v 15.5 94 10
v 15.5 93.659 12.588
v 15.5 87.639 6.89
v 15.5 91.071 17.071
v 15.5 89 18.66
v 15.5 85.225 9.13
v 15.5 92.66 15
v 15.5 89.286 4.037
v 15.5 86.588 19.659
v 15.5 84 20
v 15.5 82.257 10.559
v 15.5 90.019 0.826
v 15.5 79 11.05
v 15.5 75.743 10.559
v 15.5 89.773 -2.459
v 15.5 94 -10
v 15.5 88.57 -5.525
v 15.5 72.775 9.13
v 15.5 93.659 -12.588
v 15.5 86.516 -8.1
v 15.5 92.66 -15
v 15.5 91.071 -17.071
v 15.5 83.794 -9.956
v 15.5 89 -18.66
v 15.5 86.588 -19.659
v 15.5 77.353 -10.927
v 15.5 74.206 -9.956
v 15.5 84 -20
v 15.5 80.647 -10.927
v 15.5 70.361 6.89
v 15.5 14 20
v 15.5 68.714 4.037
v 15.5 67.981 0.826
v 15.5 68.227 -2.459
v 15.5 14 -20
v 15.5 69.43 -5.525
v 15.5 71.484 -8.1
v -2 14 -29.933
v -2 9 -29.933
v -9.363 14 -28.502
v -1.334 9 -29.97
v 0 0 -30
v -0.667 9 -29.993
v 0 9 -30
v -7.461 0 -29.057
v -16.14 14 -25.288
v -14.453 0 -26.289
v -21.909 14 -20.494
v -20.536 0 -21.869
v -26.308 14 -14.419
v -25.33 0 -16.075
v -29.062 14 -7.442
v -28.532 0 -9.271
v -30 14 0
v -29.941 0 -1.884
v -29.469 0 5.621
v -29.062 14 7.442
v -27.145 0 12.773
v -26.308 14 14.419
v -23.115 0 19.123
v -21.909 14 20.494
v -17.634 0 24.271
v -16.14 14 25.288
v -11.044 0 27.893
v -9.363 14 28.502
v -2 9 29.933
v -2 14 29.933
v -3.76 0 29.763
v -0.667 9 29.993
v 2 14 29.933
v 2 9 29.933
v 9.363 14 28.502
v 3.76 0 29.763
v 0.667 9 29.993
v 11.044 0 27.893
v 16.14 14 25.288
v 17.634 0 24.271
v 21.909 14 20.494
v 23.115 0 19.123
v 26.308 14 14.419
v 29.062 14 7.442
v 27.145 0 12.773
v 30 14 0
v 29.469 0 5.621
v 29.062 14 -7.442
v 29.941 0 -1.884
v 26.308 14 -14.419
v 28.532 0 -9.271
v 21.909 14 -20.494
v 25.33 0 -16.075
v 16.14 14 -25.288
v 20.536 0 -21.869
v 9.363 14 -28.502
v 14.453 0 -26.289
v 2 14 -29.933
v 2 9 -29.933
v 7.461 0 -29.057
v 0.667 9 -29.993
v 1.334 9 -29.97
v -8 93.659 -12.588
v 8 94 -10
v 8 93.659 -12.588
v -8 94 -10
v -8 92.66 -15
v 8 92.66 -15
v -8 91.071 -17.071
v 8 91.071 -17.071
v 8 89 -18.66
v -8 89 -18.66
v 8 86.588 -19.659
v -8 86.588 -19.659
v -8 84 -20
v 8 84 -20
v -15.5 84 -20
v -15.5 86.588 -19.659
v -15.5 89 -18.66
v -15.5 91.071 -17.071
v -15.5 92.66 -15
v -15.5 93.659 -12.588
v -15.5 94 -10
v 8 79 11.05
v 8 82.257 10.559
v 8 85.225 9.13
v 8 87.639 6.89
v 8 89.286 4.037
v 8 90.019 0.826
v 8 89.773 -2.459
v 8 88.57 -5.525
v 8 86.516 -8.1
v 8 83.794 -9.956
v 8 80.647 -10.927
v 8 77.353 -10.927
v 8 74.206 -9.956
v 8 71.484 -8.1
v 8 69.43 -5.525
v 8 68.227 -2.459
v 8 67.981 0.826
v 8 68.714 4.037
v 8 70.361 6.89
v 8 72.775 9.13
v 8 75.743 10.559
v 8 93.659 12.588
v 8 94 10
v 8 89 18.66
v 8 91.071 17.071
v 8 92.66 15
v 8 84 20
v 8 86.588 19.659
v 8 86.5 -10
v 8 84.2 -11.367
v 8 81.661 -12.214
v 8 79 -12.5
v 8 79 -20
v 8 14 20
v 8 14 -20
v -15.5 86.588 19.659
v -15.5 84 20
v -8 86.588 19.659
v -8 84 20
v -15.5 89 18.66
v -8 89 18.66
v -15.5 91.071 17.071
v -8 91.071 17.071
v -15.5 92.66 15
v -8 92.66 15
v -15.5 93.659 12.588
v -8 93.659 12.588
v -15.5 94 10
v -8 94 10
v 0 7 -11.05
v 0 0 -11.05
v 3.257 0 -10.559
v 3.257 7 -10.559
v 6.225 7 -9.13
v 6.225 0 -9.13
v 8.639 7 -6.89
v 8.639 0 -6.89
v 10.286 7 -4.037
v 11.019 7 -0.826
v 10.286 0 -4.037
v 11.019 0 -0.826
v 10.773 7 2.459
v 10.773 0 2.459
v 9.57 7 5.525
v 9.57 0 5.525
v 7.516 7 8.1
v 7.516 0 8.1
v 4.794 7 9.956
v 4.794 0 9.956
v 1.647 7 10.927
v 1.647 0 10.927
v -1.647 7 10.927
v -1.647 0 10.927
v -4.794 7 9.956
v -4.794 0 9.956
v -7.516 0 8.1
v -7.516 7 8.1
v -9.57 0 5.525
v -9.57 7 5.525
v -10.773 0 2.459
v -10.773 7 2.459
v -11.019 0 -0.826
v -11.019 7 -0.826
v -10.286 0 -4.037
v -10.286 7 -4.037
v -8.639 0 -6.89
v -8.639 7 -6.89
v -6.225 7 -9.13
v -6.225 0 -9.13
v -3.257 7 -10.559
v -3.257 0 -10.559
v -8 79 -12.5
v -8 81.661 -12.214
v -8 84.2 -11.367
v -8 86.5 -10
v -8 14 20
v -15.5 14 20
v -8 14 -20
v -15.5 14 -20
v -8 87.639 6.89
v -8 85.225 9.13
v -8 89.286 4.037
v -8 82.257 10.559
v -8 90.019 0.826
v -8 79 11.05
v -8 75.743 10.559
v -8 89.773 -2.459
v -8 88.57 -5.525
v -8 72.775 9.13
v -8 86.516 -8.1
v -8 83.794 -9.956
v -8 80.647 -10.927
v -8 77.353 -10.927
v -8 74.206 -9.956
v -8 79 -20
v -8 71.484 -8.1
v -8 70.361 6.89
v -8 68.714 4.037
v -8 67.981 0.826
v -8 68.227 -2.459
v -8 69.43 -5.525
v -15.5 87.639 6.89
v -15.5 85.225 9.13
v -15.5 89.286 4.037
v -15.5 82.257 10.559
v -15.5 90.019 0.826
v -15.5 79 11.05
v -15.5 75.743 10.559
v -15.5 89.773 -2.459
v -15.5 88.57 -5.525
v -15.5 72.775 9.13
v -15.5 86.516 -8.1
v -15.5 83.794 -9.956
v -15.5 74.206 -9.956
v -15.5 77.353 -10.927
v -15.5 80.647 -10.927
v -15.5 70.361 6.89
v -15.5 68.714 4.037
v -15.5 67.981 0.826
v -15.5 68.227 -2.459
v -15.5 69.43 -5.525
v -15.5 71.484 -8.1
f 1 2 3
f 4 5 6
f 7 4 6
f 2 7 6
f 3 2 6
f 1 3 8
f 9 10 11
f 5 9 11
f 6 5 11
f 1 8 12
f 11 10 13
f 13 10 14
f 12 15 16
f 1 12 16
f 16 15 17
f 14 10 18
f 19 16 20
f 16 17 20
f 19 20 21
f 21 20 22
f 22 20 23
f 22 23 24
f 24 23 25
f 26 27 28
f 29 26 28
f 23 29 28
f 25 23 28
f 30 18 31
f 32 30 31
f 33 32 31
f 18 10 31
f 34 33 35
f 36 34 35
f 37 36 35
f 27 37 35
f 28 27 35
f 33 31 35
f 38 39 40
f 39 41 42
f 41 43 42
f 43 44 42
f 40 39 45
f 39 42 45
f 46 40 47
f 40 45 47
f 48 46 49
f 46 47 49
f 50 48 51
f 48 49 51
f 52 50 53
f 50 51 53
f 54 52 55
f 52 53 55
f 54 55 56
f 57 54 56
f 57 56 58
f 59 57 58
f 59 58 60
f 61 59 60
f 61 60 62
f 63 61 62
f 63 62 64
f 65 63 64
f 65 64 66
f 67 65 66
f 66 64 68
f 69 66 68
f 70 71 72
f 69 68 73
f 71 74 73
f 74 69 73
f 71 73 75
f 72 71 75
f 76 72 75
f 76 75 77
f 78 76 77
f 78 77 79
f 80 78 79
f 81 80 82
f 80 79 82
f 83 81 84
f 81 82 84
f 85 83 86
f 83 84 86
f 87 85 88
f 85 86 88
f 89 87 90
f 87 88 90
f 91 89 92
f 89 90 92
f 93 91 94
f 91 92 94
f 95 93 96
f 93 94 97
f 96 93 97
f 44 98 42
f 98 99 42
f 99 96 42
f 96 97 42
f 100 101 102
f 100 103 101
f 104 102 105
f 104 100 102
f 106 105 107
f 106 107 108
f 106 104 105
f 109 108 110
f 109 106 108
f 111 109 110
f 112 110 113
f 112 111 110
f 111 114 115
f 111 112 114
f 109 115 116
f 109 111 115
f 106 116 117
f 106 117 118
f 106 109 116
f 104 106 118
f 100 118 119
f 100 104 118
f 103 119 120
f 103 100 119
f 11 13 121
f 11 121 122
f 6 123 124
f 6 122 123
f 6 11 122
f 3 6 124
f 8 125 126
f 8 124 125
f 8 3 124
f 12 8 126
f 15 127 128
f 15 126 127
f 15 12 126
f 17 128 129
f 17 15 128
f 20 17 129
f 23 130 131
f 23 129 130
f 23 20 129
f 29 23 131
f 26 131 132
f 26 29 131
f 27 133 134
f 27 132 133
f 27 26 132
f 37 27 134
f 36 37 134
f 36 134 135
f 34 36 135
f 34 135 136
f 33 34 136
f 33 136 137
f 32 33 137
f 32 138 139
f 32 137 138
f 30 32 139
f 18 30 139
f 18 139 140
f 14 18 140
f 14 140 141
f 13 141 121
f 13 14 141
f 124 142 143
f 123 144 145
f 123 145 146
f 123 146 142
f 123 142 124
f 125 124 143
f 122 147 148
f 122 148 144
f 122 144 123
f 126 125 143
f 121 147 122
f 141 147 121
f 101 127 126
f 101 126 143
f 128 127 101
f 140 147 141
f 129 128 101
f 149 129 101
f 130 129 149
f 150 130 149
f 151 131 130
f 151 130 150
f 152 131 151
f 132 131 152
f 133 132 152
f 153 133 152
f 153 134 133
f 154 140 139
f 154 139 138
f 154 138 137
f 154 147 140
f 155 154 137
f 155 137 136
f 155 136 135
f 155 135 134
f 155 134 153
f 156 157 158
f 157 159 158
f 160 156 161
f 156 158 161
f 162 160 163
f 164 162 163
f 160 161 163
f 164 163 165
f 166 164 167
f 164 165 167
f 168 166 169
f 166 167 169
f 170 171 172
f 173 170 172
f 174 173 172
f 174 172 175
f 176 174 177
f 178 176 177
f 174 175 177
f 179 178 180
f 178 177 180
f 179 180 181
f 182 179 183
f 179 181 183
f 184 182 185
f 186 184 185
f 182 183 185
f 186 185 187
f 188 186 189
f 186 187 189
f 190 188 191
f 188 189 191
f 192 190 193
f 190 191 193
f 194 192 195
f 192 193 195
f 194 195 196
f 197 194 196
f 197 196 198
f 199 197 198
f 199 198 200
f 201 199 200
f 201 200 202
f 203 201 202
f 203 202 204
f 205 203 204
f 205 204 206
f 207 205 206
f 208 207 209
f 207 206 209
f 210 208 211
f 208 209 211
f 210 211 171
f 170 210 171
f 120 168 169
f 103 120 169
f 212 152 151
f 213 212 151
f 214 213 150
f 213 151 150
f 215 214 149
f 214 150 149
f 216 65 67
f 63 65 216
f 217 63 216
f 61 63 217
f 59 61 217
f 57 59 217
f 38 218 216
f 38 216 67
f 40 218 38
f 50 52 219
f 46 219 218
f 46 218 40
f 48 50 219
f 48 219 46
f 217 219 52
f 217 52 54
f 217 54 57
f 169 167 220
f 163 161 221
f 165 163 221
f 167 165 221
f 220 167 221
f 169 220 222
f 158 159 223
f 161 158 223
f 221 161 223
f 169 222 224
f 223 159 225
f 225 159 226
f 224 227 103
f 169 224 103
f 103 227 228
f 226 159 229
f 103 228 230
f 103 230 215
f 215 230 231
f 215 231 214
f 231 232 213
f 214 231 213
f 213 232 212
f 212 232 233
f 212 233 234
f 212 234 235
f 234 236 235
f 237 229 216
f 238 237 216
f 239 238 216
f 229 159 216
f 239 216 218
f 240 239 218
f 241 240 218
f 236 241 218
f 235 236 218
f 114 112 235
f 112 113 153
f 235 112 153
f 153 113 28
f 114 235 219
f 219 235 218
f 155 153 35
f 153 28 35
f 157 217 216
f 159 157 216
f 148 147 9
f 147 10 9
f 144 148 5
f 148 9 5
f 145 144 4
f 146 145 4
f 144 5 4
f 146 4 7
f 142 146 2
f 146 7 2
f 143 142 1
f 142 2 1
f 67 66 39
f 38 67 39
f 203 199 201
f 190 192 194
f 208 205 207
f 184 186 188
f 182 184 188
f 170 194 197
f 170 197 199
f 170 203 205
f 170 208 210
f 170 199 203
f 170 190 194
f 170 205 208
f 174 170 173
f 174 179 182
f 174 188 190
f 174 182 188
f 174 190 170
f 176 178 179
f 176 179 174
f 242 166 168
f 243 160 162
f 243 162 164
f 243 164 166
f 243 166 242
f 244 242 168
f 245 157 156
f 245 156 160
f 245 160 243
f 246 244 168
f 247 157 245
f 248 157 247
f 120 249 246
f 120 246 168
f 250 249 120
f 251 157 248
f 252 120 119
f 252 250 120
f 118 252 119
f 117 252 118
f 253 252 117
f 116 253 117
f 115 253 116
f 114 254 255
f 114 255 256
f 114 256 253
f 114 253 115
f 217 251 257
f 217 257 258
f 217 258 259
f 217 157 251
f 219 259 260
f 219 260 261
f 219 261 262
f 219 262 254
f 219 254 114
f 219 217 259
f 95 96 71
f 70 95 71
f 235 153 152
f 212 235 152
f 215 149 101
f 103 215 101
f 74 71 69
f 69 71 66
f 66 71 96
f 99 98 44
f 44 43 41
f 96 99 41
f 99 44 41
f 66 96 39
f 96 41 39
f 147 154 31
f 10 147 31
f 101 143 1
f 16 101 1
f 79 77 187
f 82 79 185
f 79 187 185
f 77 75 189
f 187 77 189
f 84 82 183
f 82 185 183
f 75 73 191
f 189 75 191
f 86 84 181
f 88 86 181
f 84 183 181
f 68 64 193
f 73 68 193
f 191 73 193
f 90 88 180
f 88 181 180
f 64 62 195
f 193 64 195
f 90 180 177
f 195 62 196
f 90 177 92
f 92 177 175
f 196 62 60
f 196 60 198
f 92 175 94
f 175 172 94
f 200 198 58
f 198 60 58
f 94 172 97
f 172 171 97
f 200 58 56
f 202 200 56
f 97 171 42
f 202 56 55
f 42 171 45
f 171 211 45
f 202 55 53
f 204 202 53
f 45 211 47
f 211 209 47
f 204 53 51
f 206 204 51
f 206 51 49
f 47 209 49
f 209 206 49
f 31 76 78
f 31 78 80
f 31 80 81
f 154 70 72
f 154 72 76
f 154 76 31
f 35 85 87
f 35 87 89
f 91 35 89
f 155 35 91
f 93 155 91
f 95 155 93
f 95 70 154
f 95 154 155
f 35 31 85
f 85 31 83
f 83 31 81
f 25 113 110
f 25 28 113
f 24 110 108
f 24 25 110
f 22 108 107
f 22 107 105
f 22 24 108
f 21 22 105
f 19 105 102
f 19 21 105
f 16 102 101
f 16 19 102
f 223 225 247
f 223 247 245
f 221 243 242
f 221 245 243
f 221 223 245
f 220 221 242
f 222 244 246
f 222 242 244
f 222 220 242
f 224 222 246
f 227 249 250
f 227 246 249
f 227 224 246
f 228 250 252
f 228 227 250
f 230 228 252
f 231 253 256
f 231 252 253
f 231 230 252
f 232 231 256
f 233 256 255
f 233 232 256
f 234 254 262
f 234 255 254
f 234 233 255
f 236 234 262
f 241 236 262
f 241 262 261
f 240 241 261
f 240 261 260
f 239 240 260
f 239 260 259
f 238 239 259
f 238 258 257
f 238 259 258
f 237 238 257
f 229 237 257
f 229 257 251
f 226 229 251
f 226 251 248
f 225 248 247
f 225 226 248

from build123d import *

# Parameters (mm, degrees)
SKETCH1_R               = 30
BOSS_EXTRUDE1_DEPTH     = 14
SKETCH2_R               = 11.05
CUT_EXTRUDE1_DEPTH      = 7
SKETCH5_W               = 7.5
SKETCH5_H               = 40
BOSS_EXTRUDE2_DEPTH     = 80
FILLET1_R               = 10
CUT_EXTRUDE3_DEPTH      = 109.656569061
CUT_EXTRUDE3_DEPTH_BACK = 109.656569061
SKETCH7_R               = 11.05
CUT_EXTRUDE4_START      = -5
CUT_EXTRUDE4_DEPTH      = 5
BOSS_EXTRUDE4_DEPTH     = 16
FILLET2_R               = 10


with BuildPart() as part:
    # Sketch1 → Boss-Extrude1 (new body)
    with BuildSketch(Plane(origin=(0, 0, 0), x_dir=(1, 0, 0), z_dir=(0, 1, 0))):
        with Locations(Location((0, 0, 0), (0, 0, 90))):
            Circle(SKETCH1_R)
    extrude(amount=BOSS_EXTRUDE1_DEPTH)

    # Sketch2 → Cut-Extrude1 (cut)
    with BuildSketch(Plane.XZ):
        with Locations(Location((0, 0, 0), (0, 0, 270))):
            Circle(SKETCH2_R)
    extrude(amount=-CUT_EXTRUDE1_DEPTH, mode=Mode.SUBTRACT)

    # Sketch5 → Boss-Extrude2 (add)
    with BuildSketch(Plane(origin=(0, 14, 0), x_dir=(1, 0, 0), z_dir=(0, 1, 0))):
        with Locations((-11.75, 0)):
            Rectangle(SKETCH5_W, SKETCH5_H)
        with Locations((11.75, 0)):
            Rectangle(SKETCH5_W, SKETCH5_H)
    extrude(amount=BOSS_EXTRUDE2_DEPTH)

    # Fillet1
    fillet1_edges = [part.edges().sort_by_distance(p)[0] for p in [
        (-11.75, 94, 20),
        (-11.75, 94, -20),
        (11.75, 94, 20),
        (11.75, 94, -20),
    ]]
    fillet(fillet1_edges, radius=FILLET1_R)

    # Sketch7 → Cut-Extrude3 (cut, two sides: drawn at the far end of the back side and taken through both)
    with BuildSketch(Plane.ZY.offset(15.5).offset(-CUT_EXTRUDE3_DEPTH_BACK)):
        with Locations((0, 79)):
            Circle(SKETCH7_R)
    extrude(amount=CUT_EXTRUDE3_DEPTH + CUT_EXTRUDE3_DEPTH_BACK, mode=Mode.SUBTRACT)

    # Sketch8 → Cut-Extrude4 (cut)
    with BuildSketch(Plane(origin=(0, 14, 0), x_dir=(1, 0, 0), z_dir=(0, 1, 0)).offset(CUT_EXTRUDE4_START)):
        with BuildLine():
            Line((2, 29.933259094), (2, -29.933259094))
            ThreePointArc((2, -29.933259094), (0, -30), (-2, -29.933259094))
            Line((-2, -29.933259094), (-2, 29.933259094))
            ThreePointArc((-2, 29.933259094), (0, 30), (2, 29.933259094))
        make_face()
    extrude(amount=CUT_EXTRUDE4_DEPTH, mode=Mode.SUBTRACT)

    # Sketch9 → Boss-Extrude4 (add)
    with BuildSketch(Plane.ZY.offset(-8)):
        with BuildLine():
            Line((-10, 86.5), (-10, 94))
            Line((-10, 94), (-20, 94))
            Line((-20, 94), (-20, 79))
            Line((-20, 79), (-12.5, 79))
            ThreePointArc((-12.5, 79), (-11.858541226, 82.952847075), (-10, 86.5))
        make_face()
    extrude(amount=BOSS_EXTRUDE4_DEPTH)

    # Fillet2
    fillet2_edges = [part.edges().sort_by_distance(p)[0] for p in [
        (0, 94, -20),
    ]]
    fillet(fillet2_edges, radius=FILLET2_R - 0.0001)  # a hair under: the kernel refuses the full size


solid = part.part
